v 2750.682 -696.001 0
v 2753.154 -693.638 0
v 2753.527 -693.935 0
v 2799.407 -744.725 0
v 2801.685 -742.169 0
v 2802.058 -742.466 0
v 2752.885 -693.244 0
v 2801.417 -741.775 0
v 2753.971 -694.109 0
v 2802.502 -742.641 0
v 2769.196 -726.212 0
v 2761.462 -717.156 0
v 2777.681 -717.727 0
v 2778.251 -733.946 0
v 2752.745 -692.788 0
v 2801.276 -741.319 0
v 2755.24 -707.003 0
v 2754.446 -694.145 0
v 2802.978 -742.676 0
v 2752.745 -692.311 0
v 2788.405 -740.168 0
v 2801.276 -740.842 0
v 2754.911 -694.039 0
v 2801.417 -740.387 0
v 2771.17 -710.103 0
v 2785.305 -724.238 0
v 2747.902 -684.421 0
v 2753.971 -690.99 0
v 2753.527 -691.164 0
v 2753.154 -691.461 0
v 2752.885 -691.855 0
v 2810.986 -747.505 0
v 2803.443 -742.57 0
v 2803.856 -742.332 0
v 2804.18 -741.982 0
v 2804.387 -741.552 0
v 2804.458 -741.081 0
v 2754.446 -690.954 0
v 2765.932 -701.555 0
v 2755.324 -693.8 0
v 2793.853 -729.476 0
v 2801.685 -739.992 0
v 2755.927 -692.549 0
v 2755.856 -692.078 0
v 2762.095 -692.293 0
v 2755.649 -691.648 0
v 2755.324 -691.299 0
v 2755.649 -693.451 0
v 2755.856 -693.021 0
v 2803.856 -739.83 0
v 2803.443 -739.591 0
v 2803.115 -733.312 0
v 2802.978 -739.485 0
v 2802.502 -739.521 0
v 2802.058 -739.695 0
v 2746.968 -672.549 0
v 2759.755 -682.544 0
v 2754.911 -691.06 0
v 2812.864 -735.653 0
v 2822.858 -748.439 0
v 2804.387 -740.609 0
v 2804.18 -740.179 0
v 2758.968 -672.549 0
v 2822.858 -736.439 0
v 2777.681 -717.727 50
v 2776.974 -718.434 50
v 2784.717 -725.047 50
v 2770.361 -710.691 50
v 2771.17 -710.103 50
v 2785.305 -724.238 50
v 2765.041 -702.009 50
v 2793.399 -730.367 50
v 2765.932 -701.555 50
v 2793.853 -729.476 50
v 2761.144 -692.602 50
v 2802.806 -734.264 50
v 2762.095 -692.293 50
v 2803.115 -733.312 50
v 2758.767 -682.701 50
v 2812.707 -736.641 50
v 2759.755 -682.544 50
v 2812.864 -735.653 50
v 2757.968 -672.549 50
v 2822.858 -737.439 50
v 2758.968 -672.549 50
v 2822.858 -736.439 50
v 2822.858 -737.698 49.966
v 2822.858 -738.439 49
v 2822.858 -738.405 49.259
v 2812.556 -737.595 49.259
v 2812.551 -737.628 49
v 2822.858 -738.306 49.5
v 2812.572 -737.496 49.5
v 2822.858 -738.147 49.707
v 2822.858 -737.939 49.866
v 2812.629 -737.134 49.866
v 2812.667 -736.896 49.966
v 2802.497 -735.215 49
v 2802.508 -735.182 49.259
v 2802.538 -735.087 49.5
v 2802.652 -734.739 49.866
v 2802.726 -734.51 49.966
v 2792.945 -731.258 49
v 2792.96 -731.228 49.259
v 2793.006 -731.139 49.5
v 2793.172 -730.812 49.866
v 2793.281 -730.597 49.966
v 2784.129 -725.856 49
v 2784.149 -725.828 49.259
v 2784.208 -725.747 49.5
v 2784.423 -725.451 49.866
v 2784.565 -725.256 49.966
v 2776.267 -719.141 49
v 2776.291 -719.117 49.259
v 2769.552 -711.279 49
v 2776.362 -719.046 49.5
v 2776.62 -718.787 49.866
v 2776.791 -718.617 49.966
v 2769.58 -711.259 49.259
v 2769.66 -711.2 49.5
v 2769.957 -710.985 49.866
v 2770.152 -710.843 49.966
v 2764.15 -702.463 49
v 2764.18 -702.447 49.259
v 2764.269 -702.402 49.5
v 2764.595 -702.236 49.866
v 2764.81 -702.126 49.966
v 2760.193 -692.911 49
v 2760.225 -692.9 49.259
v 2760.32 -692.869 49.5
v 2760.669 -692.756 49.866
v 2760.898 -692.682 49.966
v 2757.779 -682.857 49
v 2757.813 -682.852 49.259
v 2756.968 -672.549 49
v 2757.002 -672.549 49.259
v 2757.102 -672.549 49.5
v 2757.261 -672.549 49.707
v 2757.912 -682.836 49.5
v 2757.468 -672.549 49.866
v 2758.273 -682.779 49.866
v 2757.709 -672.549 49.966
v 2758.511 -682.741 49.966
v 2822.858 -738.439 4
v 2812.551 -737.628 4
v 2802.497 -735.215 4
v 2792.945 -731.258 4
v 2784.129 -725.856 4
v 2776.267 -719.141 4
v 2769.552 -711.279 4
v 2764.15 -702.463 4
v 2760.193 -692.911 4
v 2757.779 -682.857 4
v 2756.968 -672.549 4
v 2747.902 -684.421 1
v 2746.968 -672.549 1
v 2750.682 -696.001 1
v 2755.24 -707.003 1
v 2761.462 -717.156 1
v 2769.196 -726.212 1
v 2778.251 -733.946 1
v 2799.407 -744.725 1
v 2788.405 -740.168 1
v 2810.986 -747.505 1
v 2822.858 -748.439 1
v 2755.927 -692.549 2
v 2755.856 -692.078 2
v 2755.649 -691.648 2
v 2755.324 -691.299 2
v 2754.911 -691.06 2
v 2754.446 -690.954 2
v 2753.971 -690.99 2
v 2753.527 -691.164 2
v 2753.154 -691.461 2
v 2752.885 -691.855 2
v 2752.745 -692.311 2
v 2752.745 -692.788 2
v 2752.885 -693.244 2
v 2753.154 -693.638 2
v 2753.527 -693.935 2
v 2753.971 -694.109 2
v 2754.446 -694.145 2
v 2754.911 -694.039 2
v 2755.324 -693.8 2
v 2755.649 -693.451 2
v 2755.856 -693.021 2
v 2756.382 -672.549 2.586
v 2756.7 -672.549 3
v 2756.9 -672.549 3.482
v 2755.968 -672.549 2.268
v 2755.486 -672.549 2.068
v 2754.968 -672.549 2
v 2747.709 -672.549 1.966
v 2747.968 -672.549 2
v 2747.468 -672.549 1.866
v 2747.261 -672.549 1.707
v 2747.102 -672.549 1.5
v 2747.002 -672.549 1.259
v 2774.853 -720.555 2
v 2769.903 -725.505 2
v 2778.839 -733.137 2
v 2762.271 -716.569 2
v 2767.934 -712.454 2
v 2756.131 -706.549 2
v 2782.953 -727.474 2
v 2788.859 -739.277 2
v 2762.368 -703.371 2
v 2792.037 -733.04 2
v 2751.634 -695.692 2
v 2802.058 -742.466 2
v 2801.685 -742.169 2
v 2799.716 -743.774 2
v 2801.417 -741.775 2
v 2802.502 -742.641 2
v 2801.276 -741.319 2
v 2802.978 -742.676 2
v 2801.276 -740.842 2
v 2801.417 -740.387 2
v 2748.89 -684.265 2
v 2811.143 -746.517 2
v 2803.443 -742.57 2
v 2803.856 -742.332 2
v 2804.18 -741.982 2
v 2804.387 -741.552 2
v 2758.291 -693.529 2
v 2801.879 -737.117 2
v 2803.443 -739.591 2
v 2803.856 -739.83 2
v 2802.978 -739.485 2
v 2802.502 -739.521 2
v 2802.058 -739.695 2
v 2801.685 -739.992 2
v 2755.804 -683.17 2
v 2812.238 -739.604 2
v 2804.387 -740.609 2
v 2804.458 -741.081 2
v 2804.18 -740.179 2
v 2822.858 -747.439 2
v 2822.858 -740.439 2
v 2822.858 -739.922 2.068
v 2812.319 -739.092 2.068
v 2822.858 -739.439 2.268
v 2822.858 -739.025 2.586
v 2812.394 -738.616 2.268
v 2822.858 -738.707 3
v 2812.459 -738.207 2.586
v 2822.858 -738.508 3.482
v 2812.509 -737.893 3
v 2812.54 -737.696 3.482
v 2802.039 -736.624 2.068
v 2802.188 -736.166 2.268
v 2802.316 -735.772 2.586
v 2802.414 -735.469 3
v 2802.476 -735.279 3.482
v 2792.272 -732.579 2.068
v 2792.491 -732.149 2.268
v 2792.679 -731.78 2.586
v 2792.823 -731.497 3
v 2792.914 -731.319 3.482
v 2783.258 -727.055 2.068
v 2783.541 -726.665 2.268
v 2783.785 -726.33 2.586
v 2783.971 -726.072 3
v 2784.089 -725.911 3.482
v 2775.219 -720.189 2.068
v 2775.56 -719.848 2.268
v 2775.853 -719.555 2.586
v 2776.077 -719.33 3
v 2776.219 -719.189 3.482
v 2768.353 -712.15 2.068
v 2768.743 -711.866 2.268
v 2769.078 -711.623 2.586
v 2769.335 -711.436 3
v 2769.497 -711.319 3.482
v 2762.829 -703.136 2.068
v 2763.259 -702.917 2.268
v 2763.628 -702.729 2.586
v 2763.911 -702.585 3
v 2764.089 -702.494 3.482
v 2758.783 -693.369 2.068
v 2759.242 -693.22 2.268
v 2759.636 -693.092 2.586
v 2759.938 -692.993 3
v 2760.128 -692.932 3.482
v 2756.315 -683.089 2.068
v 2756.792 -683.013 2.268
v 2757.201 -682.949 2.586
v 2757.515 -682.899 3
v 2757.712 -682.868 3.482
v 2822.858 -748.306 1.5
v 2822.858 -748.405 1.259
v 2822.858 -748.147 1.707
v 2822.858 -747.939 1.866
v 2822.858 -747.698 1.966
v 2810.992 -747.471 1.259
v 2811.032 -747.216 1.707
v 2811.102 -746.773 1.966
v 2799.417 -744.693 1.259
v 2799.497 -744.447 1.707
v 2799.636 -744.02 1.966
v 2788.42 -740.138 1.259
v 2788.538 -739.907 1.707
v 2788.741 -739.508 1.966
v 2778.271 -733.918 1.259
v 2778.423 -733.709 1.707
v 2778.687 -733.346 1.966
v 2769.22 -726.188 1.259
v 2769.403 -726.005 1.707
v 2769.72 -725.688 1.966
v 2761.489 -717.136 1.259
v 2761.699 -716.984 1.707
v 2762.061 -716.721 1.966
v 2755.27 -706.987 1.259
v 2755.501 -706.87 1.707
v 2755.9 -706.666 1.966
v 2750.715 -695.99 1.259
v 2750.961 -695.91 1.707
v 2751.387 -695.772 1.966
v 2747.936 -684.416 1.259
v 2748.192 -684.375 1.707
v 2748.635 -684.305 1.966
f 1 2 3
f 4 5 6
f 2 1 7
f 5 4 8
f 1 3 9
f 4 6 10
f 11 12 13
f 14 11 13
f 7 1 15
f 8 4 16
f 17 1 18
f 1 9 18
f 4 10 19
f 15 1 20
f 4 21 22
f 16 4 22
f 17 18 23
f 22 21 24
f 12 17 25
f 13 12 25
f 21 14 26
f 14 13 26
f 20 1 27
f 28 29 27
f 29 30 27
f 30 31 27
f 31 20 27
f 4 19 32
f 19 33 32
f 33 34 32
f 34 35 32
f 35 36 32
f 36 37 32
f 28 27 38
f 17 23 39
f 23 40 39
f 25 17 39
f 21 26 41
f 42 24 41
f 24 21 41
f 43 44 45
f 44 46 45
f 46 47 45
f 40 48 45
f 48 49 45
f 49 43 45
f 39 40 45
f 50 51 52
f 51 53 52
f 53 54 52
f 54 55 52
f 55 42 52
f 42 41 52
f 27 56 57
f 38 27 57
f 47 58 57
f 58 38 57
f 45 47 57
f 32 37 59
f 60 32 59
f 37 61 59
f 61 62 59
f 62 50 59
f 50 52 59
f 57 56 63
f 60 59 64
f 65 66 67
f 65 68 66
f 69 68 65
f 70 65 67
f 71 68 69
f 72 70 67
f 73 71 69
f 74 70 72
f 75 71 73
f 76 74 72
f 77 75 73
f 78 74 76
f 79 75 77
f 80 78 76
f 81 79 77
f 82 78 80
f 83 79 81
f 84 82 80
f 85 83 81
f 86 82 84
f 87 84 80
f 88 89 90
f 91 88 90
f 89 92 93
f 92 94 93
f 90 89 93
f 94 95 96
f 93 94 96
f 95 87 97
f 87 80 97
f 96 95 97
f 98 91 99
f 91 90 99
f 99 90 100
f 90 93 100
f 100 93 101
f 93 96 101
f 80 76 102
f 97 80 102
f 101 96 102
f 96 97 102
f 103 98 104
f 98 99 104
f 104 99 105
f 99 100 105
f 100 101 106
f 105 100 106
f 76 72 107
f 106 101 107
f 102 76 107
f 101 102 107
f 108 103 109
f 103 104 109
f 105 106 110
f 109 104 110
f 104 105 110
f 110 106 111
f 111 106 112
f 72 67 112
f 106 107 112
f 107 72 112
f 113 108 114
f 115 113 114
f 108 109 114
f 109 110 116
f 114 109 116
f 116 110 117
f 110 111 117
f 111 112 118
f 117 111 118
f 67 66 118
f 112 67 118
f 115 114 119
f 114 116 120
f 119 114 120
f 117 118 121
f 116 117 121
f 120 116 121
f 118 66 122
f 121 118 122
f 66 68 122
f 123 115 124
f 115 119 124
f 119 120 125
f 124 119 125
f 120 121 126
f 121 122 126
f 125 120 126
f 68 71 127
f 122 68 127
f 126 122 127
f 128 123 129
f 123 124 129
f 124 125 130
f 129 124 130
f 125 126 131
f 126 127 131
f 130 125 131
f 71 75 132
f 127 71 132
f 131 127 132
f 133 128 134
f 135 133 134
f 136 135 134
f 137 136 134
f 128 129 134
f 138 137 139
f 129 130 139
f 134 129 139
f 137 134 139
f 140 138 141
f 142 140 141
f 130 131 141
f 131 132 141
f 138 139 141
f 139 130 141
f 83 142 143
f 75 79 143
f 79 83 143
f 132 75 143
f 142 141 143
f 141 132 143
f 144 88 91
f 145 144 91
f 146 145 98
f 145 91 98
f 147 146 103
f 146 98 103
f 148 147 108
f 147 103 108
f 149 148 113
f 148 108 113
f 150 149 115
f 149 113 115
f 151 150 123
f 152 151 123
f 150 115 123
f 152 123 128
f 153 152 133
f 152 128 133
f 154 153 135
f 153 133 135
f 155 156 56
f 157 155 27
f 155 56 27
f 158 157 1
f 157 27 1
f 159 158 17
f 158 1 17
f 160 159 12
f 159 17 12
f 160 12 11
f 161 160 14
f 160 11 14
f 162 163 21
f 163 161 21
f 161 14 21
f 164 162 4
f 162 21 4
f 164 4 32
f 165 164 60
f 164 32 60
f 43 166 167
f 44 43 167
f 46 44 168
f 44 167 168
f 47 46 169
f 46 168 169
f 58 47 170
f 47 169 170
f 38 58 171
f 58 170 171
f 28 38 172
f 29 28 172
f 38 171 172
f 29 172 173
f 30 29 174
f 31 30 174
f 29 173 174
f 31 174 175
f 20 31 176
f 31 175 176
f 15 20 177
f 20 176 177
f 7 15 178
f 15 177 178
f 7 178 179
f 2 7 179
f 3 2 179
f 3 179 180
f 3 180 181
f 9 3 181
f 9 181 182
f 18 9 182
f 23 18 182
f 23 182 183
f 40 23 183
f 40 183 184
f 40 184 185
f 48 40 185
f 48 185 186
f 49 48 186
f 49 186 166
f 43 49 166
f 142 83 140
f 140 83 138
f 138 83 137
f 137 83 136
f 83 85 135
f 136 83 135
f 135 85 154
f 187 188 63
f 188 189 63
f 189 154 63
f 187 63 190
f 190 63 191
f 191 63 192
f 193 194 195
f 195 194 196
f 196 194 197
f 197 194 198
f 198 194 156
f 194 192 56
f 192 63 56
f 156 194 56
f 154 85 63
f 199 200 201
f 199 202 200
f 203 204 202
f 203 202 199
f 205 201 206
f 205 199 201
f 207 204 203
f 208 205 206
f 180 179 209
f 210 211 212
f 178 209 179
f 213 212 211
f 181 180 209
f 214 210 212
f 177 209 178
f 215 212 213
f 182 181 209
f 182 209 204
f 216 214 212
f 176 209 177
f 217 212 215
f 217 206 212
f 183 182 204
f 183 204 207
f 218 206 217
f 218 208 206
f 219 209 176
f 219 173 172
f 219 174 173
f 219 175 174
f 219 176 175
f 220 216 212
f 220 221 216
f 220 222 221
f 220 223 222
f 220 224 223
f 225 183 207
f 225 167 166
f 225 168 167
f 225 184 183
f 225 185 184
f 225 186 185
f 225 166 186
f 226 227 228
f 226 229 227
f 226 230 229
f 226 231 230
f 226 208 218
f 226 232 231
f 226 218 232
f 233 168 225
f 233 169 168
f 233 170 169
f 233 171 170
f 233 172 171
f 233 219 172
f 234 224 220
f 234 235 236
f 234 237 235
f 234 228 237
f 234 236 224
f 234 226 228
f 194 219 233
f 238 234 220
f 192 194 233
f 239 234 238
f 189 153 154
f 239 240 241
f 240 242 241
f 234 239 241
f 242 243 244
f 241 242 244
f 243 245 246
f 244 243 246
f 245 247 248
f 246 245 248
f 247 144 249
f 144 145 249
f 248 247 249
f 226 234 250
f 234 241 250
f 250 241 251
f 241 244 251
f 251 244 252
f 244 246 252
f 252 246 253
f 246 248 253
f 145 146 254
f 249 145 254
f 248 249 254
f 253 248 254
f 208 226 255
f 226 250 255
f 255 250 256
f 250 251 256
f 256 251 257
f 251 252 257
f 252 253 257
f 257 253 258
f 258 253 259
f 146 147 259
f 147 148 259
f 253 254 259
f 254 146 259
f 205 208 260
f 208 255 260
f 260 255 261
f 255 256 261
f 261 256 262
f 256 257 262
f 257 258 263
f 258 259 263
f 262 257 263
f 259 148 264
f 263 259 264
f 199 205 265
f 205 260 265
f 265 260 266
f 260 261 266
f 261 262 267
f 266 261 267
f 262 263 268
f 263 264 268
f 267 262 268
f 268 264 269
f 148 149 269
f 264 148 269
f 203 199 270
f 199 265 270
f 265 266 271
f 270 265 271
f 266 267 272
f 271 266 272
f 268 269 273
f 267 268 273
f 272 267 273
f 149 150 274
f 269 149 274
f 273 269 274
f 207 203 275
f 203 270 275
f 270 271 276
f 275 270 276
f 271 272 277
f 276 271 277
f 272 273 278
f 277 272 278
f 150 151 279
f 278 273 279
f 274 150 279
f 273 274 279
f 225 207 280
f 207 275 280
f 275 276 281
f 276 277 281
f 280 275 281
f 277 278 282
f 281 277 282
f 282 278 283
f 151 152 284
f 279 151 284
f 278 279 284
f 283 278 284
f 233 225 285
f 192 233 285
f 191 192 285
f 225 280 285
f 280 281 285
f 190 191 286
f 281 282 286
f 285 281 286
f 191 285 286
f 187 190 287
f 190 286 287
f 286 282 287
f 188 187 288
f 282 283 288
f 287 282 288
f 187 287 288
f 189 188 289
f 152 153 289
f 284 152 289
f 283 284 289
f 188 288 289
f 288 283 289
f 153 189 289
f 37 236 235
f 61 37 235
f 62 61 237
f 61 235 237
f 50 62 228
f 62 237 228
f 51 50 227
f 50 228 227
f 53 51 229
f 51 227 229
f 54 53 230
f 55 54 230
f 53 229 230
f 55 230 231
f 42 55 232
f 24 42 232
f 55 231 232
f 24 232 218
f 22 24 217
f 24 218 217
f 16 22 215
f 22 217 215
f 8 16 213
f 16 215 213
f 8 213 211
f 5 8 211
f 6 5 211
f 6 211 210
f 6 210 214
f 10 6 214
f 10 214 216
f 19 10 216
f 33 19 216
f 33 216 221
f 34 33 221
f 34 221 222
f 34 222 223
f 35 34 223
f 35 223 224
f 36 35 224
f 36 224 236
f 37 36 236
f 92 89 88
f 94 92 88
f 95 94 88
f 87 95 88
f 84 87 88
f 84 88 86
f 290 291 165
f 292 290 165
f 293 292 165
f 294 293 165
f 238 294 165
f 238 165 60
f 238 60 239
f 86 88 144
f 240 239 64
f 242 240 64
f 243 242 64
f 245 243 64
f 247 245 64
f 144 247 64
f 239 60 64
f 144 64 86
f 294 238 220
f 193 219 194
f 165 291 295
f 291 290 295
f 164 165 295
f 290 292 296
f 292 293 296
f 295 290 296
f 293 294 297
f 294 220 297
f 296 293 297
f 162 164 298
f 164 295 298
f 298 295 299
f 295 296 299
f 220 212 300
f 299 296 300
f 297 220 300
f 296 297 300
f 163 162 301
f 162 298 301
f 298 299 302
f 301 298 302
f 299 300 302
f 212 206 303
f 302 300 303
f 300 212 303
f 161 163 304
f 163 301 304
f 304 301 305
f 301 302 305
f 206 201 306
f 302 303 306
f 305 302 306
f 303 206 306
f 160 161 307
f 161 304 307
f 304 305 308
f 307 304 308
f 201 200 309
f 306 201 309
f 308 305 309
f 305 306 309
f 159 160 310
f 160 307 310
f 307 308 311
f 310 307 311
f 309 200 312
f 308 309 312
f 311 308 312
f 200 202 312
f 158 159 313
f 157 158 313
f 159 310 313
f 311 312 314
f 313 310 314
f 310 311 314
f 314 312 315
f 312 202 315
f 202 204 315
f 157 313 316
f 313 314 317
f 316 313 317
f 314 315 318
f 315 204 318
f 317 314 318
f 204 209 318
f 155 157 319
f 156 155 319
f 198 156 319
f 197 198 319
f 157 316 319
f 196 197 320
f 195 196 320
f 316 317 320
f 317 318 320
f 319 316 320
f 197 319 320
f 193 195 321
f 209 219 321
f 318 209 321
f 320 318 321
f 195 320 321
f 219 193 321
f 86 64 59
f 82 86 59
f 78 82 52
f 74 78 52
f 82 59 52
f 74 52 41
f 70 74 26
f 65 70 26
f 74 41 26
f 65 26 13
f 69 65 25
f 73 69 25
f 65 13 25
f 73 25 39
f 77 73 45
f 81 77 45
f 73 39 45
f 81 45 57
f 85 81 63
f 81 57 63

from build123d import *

# Parameters (mm, degrees)
BOSS_EXTRUDE1_DEPTH = 50
CUT_EXTRUDE1_DEPTH  = 48
FILLET1_R           = 1
FILLET2_R           = 2
SKETCH4_R           = 1.6
CUT_EXTRUDE2_DEPTH  = 2921.7864791


with BuildPart() as part:
    # Sketch2 → Boss-Extrude1 (new body)
    with BuildSketch(Plane.XY):
        with BuildLine():
            Line((2758.968126944, -672.549477124), (2746.968126944, -672.549477124))
            ThreePointArc((2746.968126944, -672.549477124), (2769.195793319, -726.211810748), (2822.858126944, -748.439477124))
            Line((2822.858126944, -748.439477124), (2822.858126944, -736.439477124))
            ThreePointArc((2822.858126944, -736.439477124), (2777.681074694, -717.726529374), (2758.968126944, -672.549477124))
        make_face()
    extrude(amount=BOSS_EXTRUDE1_DEPTH)

    # Sketch3 → Cut-Extrude1 (cut)
    with BuildSketch(Plane.XY.offset(50)):
        with BuildLine():
            Line((2756.968126944, -672.549477124), (2737.478838536, -672.549477124))
            Line((2737.478838536, -672.549477124), (2737.478838536, -757.577335174))
            Line((2737.478838536, -757.577335174), (2822.858126944, -757.577335174))
            Line((2822.858126944, -757.577335174), (2822.858126944, -738.439477124))
            ThreePointArc((2822.858126944, -738.439477124), (2776.266861131, -719.140742936), (2756.968126944, -672.549477124))
        make_face()
    extrude(amount=-CUT_EXTRUDE1_DEPTH, mode=Mode.SUBTRACT)

    # Fillet1
    fillet1_edges = [part.edges().sort_by_distance(p)[0] for p in [
        (2776.266861131, -719.140742936, 50),
        (2769.195793319, -726.211810748, 2),
    ]]
    fillet(fillet1_edges, radius=FILLET1_R)

    # Fillet2
    fillet2_edges = [part.edges().sort_by_distance(p)[0] for p in [
        (2776.266861131, -719.140742936, 2),
    ]]
    fillet(fillet2_edges, radius=FILLET2_R)

    # Sketch4 → Cut-Extrude2 (cut, through all)
    with BuildSketch(Plane.XY.offset(2)):
        with Locations((2802.858126944, -741.0807262)):
            Circle(SKETCH4_R)
        with Locations((2754.326877867, -692.549477124)):
            Circle(SKETCH4_R)
    extrude(amount=-CUT_EXTRUDE2_DEPTH, mode=Mode.SUBTRACT)


solid = part.part
